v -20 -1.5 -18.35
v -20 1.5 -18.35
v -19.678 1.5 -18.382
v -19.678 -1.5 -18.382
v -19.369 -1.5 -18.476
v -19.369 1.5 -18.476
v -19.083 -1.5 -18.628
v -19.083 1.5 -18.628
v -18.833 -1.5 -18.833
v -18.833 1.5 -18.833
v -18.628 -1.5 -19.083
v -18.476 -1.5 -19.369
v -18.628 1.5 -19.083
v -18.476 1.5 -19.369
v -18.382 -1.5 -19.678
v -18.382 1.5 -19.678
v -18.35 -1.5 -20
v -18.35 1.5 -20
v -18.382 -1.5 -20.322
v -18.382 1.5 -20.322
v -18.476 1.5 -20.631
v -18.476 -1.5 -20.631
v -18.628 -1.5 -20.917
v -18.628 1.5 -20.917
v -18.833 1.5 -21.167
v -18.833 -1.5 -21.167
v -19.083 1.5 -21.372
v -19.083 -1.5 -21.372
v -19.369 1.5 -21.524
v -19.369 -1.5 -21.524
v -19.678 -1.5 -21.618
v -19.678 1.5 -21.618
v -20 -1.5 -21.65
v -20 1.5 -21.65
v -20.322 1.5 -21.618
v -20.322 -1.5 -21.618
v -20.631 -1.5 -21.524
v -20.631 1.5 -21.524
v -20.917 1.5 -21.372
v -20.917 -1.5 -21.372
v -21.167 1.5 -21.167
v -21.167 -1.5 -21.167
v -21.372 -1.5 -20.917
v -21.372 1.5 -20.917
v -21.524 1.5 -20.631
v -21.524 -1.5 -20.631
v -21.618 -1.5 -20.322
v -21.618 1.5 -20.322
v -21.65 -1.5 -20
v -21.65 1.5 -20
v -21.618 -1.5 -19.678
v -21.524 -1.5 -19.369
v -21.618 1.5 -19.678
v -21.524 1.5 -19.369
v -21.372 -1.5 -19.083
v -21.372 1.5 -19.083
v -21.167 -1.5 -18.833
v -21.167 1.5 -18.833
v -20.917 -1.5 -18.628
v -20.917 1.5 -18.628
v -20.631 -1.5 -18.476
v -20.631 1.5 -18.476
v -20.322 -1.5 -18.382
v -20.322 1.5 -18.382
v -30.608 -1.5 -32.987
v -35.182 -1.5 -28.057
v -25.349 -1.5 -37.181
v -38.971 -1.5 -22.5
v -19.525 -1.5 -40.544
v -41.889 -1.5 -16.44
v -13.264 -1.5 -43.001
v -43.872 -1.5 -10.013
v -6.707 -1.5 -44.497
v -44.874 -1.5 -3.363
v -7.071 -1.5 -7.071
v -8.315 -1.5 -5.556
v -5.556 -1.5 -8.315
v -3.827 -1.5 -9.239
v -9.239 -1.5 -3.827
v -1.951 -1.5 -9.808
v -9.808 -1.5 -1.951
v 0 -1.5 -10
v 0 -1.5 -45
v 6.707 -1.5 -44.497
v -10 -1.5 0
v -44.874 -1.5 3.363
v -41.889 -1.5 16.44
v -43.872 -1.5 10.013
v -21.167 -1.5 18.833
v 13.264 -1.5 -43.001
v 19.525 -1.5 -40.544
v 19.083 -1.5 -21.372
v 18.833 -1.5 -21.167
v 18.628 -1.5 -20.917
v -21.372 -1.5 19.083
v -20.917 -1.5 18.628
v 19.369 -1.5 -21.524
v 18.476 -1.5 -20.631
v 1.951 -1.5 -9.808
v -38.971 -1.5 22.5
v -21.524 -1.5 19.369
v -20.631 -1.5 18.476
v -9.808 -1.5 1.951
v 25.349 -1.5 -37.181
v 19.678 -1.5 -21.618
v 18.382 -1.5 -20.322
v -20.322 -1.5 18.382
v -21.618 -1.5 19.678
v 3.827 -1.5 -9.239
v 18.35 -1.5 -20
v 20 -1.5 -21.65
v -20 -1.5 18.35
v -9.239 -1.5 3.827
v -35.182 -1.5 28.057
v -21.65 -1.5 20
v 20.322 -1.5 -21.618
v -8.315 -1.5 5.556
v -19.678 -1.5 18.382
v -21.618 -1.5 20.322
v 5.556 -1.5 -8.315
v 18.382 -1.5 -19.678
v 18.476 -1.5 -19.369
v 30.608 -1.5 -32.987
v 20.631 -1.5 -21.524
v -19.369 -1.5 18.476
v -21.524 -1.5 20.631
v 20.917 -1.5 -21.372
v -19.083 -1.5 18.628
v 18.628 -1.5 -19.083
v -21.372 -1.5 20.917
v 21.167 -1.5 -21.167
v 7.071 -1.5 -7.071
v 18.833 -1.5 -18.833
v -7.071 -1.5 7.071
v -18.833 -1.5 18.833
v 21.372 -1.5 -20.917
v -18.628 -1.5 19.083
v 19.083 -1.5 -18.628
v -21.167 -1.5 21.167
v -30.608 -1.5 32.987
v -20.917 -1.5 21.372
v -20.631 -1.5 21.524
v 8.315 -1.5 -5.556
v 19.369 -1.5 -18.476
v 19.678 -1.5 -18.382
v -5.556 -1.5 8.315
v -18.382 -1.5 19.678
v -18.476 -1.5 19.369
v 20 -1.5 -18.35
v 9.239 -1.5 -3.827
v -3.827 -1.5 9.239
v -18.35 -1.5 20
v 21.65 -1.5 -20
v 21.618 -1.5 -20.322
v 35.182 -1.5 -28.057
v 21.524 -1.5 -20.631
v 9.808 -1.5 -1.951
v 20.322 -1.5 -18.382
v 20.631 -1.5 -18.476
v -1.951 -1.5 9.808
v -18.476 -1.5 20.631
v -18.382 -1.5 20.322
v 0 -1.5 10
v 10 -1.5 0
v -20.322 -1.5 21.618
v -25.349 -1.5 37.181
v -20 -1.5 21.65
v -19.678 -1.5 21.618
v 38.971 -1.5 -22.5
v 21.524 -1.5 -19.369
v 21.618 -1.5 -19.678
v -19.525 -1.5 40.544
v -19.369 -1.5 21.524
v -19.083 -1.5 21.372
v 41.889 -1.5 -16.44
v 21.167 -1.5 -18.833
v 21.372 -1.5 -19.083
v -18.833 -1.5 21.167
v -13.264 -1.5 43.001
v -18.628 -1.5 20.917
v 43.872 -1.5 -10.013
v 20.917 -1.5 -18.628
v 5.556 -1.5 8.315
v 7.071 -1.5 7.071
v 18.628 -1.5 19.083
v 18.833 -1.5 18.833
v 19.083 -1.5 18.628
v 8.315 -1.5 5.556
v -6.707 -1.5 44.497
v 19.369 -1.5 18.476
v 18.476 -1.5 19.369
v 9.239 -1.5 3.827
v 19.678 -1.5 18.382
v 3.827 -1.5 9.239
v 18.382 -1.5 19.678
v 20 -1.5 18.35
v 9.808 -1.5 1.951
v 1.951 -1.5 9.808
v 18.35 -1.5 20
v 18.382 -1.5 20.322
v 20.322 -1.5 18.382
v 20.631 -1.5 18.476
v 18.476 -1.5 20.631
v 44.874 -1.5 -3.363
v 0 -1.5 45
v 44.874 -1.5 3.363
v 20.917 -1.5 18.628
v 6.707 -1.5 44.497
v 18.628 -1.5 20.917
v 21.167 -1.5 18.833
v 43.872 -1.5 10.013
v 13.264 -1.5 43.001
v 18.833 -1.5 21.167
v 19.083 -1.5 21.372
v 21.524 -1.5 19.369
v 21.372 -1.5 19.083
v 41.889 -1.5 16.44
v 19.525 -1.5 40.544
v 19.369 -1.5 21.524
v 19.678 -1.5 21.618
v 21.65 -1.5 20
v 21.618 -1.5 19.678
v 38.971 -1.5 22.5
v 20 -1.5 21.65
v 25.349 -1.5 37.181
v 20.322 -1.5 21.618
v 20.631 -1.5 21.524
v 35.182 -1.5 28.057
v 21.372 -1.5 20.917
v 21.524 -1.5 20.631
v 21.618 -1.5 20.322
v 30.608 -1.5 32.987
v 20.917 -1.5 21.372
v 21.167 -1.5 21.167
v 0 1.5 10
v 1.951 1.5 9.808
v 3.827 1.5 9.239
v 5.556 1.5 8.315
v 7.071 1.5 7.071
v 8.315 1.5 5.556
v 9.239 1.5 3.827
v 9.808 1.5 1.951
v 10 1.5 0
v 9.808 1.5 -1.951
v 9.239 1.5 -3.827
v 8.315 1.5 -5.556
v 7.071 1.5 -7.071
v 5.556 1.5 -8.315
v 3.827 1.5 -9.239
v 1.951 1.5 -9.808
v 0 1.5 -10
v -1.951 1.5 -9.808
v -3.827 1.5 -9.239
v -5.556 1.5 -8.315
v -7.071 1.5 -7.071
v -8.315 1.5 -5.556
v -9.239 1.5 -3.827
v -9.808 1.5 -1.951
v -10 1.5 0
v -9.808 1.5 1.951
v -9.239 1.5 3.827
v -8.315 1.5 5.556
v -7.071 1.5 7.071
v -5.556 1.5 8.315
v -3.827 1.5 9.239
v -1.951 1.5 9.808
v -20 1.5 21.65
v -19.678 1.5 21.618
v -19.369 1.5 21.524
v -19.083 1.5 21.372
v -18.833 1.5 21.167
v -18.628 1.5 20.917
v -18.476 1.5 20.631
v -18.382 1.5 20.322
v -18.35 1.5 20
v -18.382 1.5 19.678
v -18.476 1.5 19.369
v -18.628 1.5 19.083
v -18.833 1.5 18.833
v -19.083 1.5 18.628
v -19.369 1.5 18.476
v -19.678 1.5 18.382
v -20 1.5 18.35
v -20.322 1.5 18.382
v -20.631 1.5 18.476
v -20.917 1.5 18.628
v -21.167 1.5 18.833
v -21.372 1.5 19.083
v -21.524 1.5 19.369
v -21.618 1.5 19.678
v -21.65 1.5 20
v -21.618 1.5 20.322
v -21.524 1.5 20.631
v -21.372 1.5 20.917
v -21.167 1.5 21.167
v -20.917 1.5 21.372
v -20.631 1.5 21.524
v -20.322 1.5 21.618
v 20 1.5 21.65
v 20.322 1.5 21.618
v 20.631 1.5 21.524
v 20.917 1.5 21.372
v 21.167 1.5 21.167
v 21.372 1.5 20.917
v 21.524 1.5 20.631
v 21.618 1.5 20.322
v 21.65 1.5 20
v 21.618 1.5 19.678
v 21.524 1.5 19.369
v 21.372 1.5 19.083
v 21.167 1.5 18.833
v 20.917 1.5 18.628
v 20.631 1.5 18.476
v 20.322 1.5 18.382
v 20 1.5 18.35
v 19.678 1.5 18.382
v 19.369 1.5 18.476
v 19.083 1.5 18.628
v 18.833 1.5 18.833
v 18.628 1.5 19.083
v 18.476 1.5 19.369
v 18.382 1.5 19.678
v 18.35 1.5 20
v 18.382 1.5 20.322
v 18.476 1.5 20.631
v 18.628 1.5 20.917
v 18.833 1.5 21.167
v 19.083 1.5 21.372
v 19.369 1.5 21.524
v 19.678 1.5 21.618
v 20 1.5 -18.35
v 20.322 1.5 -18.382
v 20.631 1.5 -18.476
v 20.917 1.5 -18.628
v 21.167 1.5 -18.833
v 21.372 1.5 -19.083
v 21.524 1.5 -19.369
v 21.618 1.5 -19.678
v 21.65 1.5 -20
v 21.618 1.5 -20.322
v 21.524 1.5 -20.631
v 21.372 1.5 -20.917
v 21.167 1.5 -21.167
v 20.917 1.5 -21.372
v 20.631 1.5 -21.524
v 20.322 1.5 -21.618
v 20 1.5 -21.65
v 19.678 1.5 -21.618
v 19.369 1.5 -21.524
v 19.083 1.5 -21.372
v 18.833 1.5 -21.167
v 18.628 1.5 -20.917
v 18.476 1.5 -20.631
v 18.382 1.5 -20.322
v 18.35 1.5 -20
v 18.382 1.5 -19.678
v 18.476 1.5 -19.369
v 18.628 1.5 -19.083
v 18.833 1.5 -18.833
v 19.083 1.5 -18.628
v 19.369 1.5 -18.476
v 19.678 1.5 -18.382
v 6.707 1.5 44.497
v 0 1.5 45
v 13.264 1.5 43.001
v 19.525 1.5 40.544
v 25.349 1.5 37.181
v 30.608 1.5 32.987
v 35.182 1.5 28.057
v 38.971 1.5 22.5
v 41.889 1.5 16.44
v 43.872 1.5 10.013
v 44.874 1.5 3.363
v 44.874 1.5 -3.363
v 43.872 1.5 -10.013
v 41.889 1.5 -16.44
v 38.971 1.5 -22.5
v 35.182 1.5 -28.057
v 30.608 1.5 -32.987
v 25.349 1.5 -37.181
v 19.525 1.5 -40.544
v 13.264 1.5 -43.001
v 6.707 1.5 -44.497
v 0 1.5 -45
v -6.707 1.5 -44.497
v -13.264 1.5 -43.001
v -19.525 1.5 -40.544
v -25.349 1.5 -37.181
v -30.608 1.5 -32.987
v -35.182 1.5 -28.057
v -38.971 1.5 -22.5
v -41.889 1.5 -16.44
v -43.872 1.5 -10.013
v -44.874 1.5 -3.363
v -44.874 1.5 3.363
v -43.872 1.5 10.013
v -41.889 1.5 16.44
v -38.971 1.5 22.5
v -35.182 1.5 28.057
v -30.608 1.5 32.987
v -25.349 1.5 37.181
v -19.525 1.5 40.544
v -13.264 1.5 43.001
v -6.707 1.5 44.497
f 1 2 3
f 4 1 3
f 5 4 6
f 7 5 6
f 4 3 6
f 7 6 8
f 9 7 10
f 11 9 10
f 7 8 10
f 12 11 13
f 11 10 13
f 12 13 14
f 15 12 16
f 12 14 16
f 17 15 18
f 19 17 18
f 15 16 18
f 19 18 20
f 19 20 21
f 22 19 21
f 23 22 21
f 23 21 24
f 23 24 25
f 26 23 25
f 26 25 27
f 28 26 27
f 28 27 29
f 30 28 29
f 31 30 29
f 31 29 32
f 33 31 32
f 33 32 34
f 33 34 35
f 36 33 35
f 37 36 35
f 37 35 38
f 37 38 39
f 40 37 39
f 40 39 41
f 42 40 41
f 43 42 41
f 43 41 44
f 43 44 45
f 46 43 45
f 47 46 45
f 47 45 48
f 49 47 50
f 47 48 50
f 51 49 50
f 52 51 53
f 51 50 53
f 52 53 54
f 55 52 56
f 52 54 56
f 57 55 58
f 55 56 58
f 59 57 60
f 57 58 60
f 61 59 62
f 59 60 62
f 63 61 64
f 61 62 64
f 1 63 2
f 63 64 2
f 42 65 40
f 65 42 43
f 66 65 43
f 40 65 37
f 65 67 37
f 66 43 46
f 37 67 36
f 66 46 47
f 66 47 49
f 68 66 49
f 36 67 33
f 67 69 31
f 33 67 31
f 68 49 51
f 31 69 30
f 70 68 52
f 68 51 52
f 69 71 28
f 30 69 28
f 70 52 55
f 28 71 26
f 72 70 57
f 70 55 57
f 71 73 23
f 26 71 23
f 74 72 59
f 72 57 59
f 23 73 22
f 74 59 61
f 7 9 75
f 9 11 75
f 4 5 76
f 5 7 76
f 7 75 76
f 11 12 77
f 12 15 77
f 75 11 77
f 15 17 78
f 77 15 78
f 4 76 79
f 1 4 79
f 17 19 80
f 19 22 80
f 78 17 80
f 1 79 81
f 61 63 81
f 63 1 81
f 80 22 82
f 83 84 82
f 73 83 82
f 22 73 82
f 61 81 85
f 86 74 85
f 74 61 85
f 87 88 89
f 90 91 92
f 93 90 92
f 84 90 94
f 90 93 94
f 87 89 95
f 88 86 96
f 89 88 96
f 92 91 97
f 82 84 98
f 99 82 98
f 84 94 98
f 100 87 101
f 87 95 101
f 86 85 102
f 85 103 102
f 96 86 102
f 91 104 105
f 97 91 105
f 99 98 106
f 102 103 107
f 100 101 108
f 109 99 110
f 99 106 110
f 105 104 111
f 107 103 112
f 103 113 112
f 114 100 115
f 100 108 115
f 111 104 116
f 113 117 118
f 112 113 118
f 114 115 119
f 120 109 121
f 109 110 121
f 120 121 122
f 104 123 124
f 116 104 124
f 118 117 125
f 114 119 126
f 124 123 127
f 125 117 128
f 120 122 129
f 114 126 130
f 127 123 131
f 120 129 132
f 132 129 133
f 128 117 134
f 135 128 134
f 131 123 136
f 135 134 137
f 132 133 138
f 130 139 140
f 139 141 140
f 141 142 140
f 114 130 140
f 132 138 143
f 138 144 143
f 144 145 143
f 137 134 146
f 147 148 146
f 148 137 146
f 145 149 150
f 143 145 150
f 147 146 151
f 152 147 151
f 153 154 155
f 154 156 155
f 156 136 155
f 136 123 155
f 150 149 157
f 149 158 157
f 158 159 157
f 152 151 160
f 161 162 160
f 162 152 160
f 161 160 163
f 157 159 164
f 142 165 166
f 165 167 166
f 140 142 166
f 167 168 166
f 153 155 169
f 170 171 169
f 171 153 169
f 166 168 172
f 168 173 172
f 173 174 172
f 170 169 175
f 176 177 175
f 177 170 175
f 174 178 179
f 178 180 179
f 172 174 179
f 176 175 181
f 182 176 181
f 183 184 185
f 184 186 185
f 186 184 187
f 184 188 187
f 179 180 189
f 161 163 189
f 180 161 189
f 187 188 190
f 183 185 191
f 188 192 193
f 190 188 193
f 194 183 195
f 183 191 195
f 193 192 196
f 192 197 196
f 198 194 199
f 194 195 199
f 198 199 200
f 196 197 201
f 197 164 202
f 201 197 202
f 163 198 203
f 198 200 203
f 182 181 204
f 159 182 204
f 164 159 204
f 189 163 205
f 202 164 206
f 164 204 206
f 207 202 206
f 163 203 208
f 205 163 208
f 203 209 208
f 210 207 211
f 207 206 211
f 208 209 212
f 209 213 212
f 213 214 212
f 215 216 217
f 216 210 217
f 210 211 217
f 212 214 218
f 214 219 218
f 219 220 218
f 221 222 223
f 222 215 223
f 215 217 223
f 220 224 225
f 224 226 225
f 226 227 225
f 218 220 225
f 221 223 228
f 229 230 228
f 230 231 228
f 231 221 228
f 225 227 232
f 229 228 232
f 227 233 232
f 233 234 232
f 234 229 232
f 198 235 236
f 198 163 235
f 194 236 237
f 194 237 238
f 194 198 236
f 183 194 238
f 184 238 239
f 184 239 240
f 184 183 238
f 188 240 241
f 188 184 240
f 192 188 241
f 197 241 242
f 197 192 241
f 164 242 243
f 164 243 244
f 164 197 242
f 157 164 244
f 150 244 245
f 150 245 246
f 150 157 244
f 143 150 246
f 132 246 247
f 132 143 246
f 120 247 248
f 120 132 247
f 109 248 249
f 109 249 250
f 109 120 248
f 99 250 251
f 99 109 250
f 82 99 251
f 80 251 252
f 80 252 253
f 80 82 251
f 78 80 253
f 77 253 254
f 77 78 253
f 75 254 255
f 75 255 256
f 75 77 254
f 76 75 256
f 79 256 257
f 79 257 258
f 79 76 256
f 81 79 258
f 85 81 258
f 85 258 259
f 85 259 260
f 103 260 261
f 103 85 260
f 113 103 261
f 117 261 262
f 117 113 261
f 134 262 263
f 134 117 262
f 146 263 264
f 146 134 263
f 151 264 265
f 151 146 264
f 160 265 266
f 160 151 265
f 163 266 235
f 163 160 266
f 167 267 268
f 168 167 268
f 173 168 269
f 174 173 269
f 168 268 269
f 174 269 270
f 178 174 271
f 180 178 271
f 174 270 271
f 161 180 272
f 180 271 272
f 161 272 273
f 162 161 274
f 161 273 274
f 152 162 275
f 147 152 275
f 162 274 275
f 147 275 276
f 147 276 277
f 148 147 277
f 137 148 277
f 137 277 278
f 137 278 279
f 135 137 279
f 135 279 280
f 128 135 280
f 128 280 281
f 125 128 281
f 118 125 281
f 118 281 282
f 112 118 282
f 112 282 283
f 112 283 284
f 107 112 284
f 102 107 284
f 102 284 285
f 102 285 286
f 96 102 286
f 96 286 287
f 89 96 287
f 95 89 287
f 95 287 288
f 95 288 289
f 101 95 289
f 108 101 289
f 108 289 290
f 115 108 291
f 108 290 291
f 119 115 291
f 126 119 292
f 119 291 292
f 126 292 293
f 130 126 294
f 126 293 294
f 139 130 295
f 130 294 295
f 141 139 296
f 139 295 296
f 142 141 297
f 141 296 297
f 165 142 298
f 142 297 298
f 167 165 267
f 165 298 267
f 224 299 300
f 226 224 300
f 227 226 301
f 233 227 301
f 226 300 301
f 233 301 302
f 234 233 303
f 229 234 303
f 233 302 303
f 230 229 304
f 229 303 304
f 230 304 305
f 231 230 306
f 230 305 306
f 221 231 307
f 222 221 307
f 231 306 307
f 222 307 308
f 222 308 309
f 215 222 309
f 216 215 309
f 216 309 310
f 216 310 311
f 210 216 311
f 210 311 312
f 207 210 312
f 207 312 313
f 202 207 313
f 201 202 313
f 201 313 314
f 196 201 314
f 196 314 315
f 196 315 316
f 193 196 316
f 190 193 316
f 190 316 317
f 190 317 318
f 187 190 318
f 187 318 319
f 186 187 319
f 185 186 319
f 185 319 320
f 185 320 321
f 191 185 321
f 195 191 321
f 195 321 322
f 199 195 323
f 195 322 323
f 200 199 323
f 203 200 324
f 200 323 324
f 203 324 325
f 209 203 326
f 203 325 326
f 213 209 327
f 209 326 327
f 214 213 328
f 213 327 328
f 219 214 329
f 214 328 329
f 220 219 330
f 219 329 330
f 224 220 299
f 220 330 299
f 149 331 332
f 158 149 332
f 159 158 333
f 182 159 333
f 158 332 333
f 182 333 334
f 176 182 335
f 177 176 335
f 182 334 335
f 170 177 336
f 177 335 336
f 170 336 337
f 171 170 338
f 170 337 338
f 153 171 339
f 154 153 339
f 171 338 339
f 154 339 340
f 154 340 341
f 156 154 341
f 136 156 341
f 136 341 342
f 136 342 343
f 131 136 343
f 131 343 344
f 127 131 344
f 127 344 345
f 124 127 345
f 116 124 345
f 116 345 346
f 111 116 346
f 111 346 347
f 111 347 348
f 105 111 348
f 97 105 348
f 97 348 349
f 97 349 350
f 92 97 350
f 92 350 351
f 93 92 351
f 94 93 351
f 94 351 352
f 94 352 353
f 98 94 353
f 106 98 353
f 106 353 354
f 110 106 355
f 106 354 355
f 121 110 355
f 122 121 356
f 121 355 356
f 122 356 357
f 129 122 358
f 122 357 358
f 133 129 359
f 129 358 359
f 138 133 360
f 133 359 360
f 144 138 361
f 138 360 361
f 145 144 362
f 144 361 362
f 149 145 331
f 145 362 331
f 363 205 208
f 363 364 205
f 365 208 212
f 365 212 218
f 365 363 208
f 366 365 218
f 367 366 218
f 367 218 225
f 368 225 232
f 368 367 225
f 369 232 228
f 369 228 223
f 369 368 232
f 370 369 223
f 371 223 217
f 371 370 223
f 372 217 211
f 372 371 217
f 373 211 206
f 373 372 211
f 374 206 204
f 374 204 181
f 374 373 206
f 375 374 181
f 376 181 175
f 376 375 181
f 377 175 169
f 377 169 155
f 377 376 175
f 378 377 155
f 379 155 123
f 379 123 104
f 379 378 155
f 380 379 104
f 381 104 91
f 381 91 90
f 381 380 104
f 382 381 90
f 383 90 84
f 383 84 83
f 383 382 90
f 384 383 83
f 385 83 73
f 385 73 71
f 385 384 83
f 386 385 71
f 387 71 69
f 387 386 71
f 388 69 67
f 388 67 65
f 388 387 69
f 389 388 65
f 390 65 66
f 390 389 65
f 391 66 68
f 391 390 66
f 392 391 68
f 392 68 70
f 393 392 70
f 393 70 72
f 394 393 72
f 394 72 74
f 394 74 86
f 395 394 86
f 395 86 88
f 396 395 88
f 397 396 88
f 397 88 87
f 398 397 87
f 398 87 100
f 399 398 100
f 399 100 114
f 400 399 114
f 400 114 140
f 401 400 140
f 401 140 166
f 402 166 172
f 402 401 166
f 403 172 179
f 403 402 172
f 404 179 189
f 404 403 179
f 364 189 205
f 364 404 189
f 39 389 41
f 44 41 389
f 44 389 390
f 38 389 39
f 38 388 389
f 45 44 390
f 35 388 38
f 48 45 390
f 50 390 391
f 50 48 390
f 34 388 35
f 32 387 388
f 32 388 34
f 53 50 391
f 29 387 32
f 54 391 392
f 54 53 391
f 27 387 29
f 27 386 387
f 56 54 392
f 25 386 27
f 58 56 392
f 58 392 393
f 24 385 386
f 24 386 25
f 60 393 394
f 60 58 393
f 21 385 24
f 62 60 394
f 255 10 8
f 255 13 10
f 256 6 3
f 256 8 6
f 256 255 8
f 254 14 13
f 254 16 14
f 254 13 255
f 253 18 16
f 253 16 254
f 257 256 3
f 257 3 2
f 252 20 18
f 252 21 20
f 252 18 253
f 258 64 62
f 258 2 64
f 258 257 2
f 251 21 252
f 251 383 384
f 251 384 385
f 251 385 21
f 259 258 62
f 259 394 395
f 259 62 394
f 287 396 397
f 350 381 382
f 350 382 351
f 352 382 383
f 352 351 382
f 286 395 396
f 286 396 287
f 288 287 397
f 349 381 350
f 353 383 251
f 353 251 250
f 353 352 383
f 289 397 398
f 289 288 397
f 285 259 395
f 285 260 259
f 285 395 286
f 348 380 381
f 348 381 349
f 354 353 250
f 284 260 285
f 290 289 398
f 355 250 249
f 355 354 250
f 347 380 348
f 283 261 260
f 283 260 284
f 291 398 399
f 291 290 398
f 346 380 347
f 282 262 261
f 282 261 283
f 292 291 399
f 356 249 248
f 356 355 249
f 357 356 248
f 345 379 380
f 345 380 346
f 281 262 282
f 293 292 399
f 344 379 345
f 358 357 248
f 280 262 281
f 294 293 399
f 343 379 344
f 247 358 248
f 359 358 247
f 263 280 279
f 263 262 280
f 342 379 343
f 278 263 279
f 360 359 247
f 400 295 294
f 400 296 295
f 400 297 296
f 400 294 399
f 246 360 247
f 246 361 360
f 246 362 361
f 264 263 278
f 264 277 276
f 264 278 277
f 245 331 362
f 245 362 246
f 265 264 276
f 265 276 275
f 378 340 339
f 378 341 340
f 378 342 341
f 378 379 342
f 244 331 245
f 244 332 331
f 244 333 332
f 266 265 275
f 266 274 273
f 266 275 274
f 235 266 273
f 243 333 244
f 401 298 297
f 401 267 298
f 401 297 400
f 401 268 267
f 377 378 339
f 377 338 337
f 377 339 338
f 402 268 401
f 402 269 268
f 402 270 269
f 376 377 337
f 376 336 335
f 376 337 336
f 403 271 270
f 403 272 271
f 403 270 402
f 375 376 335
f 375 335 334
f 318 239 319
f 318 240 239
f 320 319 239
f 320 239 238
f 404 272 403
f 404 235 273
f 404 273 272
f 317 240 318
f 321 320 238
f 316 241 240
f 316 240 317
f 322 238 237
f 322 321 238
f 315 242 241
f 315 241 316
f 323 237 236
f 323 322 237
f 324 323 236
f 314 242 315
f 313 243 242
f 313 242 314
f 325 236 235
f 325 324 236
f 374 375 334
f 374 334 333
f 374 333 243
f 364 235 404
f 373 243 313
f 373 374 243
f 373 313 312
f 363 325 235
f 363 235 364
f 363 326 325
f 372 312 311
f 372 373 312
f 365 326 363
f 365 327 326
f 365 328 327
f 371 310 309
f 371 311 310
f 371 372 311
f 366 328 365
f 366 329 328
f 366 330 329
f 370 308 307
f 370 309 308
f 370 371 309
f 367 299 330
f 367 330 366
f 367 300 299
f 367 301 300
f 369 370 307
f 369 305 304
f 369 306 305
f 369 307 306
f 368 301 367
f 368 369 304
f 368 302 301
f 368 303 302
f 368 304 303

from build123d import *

# Parameters (mm, degrees)
SKETCH1_R           = 45
SKETCH1_R_2         = 10
BOSS_EXTRUDE1_DEPTH = 1.5
SKETCH2_R           = 1.65
CUT_EXTRUDE1_DEPTH  = 10


with BuildPart() as part:
    # Sketch1 → Boss-Extrude1 (new, symmetric)
    with BuildSketch(Plane(origin=(0, 0, 0), x_dir=(1, 0, 0), z_dir=(0, 1, 0))):
        with Locations(Location((0, 0, 0), (0, 0, 270))):
            Circle(SKETCH1_R)
        with Locations(Location((0, 0, 0), (0, 0, 270))):
            Circle(SKETCH1_R_2, mode=Mode.SUBTRACT)
    extrude(amount=BOSS_EXTRUDE1_DEPTH, both=True)

    # Sketch2 → Cut-Extrude1 (cut)
    with BuildSketch(Plane(origin=(0, 1.5, 0), x_dir=(1, 0, 0), z_dir=(0, 1, 0))):
        with Locations(Location((-20, -20, 0), (0, 0, 270))):
            Circle(SKETCH2_R)
        with Locations(Location((-20, 20, 0), (0, 0, 270))):
            Circle(SKETCH2_R)
        with Locations(Location((20, 20, 0), (0, 0, 270))):
            Circle(SKETCH2_R)
        with Locations(Location((20, -20, 0), (0, 0, 270))):
            Circle(SKETCH2_R)
    extrude(amount=-CUT_EXTRUDE1_DEPTH, mode=Mode.SUBTRACT)


solid = part.part
